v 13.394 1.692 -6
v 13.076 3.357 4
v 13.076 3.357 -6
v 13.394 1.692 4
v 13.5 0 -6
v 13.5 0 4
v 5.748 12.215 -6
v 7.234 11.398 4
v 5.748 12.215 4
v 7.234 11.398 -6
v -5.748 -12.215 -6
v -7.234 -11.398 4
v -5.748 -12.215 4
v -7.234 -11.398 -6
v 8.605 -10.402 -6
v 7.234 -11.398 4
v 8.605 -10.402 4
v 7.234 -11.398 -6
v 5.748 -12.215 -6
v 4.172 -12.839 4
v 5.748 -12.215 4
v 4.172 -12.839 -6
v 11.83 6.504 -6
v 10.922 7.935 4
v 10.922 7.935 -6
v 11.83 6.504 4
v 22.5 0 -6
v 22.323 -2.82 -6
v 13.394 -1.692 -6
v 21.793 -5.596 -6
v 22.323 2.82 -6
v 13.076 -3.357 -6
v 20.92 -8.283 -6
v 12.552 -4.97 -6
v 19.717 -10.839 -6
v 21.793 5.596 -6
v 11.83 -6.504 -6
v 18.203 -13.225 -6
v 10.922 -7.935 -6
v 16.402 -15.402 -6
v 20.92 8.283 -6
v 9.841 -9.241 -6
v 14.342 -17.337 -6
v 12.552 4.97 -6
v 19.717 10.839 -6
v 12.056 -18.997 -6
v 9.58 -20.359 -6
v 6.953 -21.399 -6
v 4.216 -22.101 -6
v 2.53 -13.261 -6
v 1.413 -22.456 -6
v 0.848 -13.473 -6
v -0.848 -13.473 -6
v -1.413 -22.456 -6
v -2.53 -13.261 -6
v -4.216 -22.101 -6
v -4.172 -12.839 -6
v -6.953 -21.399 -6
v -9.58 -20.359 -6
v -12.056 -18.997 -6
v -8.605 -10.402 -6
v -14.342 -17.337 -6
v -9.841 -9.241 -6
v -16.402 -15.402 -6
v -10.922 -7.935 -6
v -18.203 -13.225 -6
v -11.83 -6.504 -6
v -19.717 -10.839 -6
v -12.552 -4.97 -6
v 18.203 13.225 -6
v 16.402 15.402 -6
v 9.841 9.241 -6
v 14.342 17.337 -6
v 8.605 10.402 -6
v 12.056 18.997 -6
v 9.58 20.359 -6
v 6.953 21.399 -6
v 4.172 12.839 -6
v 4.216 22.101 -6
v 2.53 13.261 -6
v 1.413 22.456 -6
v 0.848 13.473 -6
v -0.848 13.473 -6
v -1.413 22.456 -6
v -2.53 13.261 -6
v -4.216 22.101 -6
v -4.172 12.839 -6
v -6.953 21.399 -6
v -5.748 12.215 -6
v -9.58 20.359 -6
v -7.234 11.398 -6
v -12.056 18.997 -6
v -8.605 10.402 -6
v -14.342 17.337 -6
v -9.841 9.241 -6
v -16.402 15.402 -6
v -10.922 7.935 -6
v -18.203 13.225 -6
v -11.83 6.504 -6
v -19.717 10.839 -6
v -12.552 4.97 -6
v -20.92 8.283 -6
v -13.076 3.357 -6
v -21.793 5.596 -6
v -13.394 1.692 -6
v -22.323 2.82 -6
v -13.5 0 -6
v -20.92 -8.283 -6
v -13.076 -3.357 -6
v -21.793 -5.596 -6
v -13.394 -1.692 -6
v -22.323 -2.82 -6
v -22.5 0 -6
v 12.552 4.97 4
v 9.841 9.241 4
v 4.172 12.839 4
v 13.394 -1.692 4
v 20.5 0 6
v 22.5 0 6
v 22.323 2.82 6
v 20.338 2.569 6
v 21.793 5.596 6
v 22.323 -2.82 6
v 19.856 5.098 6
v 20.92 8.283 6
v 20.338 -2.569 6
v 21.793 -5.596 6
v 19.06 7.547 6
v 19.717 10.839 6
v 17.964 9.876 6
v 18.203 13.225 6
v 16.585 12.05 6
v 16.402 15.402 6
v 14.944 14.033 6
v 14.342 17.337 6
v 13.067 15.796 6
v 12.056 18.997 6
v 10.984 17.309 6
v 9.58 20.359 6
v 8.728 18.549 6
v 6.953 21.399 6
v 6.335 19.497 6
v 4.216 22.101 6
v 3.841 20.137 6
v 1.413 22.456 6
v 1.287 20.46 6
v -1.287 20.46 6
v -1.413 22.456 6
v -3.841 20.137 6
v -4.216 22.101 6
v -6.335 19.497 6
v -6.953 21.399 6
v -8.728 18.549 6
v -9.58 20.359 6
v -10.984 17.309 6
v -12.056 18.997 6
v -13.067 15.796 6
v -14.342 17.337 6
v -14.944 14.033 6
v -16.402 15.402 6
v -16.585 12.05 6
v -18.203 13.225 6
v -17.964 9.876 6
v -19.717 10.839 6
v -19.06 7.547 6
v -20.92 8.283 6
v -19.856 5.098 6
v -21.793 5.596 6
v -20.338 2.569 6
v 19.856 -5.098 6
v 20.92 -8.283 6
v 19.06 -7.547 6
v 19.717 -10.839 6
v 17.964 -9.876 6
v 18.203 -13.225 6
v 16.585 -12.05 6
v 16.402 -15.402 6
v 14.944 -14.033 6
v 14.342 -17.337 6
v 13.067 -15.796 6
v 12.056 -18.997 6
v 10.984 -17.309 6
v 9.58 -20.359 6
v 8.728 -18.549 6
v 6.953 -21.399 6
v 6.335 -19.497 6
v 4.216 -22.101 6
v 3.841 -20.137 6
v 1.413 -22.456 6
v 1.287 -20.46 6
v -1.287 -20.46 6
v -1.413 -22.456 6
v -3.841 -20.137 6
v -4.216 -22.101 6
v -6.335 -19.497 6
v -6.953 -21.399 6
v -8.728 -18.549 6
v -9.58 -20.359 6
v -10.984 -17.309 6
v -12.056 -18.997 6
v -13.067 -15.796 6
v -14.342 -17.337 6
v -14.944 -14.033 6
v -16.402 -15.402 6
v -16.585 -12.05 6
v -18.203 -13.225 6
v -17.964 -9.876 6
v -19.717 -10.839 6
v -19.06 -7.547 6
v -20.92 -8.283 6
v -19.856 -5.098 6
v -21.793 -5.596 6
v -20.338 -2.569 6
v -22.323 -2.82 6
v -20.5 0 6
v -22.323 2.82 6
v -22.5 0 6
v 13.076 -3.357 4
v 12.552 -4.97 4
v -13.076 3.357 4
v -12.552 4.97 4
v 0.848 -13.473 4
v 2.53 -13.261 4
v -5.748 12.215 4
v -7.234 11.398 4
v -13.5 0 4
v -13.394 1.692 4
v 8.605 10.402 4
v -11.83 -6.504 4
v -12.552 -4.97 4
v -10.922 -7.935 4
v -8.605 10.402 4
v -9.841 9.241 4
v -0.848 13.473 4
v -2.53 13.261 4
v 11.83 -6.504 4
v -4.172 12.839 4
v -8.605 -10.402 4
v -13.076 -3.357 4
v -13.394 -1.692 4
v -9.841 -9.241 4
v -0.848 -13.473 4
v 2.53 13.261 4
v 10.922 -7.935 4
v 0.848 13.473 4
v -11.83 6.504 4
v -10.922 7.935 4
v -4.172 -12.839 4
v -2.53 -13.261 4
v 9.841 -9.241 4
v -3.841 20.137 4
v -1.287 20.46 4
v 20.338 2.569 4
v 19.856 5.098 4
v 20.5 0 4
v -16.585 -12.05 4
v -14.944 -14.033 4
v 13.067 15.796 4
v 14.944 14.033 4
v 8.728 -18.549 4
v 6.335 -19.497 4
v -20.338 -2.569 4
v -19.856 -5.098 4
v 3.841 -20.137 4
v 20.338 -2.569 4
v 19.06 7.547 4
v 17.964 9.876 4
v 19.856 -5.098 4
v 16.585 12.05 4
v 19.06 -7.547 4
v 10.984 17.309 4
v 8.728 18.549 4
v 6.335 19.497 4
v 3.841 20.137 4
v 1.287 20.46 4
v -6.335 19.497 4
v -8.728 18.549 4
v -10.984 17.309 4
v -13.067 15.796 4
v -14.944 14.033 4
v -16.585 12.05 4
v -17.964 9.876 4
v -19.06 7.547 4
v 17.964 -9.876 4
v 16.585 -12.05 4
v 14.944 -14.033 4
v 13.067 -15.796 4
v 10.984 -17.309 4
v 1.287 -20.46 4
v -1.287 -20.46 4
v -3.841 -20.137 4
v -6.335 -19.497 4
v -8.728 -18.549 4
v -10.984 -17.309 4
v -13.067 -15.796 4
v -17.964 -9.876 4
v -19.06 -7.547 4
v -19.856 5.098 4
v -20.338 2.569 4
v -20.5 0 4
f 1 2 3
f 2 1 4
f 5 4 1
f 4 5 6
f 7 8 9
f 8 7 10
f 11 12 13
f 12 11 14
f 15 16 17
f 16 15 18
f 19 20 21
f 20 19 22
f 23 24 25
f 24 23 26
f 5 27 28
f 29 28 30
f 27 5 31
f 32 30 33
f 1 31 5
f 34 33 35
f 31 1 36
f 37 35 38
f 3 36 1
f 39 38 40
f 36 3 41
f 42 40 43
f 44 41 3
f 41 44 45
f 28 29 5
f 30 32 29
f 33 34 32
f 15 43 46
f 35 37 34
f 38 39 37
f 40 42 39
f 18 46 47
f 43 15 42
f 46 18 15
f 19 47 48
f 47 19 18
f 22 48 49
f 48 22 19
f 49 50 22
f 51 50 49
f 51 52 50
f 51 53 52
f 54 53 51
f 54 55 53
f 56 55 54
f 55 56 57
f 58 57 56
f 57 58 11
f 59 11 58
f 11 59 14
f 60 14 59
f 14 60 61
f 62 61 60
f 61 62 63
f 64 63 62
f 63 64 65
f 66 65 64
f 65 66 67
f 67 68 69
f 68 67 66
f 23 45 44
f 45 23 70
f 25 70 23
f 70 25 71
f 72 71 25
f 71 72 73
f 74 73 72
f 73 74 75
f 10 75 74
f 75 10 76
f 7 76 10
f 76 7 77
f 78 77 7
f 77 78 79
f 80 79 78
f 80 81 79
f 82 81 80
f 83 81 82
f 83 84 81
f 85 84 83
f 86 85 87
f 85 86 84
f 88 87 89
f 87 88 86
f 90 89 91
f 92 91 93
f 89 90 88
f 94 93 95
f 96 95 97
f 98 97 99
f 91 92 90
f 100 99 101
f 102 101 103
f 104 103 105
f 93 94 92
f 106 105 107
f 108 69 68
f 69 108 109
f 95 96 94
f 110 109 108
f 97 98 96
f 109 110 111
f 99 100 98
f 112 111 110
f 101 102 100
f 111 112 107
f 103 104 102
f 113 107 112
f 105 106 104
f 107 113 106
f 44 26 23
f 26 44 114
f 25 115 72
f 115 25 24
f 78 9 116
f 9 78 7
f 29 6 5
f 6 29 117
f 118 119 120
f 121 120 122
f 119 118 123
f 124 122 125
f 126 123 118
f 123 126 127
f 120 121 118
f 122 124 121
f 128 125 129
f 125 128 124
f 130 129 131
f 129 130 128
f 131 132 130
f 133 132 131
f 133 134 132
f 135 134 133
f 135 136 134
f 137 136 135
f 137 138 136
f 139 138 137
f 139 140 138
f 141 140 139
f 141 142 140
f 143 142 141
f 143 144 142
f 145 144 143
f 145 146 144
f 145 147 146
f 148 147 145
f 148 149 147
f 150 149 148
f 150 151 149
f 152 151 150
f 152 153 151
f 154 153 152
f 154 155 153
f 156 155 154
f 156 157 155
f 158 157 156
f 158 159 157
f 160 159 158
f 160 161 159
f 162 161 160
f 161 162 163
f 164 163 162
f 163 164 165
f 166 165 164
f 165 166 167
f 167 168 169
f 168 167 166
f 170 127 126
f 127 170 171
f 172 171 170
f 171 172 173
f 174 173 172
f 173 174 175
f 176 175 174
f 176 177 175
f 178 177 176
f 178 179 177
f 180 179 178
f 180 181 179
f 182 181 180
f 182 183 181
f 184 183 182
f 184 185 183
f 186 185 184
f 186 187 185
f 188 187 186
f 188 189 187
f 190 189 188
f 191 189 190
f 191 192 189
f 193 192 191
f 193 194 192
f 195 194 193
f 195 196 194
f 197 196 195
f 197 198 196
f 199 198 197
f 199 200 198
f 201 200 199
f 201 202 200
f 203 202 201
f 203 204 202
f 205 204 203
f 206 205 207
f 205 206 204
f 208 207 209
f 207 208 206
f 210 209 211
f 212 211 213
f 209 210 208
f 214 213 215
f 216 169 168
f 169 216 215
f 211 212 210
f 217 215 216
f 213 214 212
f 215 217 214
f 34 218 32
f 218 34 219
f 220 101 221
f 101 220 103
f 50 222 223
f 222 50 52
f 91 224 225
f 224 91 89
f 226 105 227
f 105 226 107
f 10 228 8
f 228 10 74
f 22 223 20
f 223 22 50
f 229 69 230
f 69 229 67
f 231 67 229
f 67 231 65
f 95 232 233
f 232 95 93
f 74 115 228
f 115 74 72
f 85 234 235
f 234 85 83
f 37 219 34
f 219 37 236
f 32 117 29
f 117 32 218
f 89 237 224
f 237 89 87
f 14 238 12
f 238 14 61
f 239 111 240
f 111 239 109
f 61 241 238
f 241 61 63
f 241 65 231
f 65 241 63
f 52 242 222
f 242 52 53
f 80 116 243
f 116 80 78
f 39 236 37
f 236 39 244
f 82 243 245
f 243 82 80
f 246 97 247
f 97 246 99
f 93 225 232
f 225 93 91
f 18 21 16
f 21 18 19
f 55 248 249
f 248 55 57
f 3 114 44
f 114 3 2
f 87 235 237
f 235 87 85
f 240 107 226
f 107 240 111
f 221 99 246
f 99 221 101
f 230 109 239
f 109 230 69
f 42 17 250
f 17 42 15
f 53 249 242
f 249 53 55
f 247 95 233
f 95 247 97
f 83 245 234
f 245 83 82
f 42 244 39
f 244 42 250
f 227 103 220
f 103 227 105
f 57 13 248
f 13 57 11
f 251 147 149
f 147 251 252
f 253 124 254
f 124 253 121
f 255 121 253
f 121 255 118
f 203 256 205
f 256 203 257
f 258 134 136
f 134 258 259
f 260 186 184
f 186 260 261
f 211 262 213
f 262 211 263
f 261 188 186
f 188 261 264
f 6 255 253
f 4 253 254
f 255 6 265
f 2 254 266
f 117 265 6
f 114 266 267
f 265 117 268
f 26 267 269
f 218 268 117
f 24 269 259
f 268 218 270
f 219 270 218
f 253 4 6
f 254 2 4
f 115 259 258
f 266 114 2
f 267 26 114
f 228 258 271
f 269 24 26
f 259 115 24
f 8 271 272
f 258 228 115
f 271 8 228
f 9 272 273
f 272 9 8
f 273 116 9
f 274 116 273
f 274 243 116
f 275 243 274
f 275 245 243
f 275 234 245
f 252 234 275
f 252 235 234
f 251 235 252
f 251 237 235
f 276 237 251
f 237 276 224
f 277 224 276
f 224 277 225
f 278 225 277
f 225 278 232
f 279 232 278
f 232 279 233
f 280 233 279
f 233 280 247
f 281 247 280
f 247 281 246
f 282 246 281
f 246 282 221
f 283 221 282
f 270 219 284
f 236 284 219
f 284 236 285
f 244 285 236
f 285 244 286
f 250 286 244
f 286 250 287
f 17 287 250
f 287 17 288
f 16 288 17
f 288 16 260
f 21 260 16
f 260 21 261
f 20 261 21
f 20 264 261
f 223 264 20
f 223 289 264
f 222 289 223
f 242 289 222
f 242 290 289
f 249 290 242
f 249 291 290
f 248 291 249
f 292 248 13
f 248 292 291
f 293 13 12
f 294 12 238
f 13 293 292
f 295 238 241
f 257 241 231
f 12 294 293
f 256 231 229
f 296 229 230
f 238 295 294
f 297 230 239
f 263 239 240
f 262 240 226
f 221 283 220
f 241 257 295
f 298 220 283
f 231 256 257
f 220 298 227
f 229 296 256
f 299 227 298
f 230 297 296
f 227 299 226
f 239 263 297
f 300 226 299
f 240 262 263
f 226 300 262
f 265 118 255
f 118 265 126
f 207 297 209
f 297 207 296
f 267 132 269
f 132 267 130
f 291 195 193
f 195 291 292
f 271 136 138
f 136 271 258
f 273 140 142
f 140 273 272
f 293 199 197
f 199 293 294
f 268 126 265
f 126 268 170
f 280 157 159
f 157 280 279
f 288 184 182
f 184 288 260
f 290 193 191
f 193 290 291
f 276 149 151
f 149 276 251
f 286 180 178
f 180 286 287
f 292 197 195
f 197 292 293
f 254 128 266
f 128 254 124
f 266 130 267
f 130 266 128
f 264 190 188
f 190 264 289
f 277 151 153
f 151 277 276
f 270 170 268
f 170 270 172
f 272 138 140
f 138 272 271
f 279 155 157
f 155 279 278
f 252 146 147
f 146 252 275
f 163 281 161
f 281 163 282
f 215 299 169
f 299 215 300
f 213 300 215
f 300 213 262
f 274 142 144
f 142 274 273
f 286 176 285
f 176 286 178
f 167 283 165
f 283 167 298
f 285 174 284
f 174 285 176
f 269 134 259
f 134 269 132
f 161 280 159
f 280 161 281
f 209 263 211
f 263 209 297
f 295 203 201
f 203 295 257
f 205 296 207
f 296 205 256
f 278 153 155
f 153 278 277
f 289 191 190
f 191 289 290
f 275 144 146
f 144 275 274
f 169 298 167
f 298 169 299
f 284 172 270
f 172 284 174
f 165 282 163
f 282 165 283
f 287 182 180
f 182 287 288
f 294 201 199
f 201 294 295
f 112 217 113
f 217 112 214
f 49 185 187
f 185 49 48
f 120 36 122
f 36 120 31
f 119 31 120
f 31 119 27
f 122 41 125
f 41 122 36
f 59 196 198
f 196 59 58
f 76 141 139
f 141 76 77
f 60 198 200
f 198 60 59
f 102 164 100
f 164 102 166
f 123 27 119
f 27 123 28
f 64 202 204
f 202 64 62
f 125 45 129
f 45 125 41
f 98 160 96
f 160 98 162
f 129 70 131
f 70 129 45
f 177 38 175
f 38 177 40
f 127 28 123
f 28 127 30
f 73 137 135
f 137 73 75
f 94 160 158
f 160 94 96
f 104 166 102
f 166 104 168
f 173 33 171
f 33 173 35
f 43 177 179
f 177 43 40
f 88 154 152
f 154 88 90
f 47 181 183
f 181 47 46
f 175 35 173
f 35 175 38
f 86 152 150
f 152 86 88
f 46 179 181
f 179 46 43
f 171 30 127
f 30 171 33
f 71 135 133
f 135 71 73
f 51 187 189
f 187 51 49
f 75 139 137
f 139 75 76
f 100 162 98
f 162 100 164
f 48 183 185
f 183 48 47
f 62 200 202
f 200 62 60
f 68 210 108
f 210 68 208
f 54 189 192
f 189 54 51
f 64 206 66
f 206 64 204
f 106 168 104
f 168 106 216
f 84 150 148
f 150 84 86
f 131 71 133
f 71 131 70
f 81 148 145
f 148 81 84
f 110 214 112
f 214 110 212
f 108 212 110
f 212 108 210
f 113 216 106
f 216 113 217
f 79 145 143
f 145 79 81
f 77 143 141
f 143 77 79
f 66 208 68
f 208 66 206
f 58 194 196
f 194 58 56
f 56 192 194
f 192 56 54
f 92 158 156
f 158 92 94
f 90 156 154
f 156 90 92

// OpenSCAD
$fn = 50;


difference() {
	union() {
		translate(v = [0, 0, -6.0000000000]) {
			cylinder(h = 12, r = 22.5000000000);
		}
	}
	union() {
		#translate(v = [0, 0, -6.0000000000]) {
			cylinder(h = 12, r = 13.5000000000);
		}
		translate(v = [0, 0, 4.0000000000]) {
			cylinder(h = 2, r = 20.5000000000);
		}
	}
}
